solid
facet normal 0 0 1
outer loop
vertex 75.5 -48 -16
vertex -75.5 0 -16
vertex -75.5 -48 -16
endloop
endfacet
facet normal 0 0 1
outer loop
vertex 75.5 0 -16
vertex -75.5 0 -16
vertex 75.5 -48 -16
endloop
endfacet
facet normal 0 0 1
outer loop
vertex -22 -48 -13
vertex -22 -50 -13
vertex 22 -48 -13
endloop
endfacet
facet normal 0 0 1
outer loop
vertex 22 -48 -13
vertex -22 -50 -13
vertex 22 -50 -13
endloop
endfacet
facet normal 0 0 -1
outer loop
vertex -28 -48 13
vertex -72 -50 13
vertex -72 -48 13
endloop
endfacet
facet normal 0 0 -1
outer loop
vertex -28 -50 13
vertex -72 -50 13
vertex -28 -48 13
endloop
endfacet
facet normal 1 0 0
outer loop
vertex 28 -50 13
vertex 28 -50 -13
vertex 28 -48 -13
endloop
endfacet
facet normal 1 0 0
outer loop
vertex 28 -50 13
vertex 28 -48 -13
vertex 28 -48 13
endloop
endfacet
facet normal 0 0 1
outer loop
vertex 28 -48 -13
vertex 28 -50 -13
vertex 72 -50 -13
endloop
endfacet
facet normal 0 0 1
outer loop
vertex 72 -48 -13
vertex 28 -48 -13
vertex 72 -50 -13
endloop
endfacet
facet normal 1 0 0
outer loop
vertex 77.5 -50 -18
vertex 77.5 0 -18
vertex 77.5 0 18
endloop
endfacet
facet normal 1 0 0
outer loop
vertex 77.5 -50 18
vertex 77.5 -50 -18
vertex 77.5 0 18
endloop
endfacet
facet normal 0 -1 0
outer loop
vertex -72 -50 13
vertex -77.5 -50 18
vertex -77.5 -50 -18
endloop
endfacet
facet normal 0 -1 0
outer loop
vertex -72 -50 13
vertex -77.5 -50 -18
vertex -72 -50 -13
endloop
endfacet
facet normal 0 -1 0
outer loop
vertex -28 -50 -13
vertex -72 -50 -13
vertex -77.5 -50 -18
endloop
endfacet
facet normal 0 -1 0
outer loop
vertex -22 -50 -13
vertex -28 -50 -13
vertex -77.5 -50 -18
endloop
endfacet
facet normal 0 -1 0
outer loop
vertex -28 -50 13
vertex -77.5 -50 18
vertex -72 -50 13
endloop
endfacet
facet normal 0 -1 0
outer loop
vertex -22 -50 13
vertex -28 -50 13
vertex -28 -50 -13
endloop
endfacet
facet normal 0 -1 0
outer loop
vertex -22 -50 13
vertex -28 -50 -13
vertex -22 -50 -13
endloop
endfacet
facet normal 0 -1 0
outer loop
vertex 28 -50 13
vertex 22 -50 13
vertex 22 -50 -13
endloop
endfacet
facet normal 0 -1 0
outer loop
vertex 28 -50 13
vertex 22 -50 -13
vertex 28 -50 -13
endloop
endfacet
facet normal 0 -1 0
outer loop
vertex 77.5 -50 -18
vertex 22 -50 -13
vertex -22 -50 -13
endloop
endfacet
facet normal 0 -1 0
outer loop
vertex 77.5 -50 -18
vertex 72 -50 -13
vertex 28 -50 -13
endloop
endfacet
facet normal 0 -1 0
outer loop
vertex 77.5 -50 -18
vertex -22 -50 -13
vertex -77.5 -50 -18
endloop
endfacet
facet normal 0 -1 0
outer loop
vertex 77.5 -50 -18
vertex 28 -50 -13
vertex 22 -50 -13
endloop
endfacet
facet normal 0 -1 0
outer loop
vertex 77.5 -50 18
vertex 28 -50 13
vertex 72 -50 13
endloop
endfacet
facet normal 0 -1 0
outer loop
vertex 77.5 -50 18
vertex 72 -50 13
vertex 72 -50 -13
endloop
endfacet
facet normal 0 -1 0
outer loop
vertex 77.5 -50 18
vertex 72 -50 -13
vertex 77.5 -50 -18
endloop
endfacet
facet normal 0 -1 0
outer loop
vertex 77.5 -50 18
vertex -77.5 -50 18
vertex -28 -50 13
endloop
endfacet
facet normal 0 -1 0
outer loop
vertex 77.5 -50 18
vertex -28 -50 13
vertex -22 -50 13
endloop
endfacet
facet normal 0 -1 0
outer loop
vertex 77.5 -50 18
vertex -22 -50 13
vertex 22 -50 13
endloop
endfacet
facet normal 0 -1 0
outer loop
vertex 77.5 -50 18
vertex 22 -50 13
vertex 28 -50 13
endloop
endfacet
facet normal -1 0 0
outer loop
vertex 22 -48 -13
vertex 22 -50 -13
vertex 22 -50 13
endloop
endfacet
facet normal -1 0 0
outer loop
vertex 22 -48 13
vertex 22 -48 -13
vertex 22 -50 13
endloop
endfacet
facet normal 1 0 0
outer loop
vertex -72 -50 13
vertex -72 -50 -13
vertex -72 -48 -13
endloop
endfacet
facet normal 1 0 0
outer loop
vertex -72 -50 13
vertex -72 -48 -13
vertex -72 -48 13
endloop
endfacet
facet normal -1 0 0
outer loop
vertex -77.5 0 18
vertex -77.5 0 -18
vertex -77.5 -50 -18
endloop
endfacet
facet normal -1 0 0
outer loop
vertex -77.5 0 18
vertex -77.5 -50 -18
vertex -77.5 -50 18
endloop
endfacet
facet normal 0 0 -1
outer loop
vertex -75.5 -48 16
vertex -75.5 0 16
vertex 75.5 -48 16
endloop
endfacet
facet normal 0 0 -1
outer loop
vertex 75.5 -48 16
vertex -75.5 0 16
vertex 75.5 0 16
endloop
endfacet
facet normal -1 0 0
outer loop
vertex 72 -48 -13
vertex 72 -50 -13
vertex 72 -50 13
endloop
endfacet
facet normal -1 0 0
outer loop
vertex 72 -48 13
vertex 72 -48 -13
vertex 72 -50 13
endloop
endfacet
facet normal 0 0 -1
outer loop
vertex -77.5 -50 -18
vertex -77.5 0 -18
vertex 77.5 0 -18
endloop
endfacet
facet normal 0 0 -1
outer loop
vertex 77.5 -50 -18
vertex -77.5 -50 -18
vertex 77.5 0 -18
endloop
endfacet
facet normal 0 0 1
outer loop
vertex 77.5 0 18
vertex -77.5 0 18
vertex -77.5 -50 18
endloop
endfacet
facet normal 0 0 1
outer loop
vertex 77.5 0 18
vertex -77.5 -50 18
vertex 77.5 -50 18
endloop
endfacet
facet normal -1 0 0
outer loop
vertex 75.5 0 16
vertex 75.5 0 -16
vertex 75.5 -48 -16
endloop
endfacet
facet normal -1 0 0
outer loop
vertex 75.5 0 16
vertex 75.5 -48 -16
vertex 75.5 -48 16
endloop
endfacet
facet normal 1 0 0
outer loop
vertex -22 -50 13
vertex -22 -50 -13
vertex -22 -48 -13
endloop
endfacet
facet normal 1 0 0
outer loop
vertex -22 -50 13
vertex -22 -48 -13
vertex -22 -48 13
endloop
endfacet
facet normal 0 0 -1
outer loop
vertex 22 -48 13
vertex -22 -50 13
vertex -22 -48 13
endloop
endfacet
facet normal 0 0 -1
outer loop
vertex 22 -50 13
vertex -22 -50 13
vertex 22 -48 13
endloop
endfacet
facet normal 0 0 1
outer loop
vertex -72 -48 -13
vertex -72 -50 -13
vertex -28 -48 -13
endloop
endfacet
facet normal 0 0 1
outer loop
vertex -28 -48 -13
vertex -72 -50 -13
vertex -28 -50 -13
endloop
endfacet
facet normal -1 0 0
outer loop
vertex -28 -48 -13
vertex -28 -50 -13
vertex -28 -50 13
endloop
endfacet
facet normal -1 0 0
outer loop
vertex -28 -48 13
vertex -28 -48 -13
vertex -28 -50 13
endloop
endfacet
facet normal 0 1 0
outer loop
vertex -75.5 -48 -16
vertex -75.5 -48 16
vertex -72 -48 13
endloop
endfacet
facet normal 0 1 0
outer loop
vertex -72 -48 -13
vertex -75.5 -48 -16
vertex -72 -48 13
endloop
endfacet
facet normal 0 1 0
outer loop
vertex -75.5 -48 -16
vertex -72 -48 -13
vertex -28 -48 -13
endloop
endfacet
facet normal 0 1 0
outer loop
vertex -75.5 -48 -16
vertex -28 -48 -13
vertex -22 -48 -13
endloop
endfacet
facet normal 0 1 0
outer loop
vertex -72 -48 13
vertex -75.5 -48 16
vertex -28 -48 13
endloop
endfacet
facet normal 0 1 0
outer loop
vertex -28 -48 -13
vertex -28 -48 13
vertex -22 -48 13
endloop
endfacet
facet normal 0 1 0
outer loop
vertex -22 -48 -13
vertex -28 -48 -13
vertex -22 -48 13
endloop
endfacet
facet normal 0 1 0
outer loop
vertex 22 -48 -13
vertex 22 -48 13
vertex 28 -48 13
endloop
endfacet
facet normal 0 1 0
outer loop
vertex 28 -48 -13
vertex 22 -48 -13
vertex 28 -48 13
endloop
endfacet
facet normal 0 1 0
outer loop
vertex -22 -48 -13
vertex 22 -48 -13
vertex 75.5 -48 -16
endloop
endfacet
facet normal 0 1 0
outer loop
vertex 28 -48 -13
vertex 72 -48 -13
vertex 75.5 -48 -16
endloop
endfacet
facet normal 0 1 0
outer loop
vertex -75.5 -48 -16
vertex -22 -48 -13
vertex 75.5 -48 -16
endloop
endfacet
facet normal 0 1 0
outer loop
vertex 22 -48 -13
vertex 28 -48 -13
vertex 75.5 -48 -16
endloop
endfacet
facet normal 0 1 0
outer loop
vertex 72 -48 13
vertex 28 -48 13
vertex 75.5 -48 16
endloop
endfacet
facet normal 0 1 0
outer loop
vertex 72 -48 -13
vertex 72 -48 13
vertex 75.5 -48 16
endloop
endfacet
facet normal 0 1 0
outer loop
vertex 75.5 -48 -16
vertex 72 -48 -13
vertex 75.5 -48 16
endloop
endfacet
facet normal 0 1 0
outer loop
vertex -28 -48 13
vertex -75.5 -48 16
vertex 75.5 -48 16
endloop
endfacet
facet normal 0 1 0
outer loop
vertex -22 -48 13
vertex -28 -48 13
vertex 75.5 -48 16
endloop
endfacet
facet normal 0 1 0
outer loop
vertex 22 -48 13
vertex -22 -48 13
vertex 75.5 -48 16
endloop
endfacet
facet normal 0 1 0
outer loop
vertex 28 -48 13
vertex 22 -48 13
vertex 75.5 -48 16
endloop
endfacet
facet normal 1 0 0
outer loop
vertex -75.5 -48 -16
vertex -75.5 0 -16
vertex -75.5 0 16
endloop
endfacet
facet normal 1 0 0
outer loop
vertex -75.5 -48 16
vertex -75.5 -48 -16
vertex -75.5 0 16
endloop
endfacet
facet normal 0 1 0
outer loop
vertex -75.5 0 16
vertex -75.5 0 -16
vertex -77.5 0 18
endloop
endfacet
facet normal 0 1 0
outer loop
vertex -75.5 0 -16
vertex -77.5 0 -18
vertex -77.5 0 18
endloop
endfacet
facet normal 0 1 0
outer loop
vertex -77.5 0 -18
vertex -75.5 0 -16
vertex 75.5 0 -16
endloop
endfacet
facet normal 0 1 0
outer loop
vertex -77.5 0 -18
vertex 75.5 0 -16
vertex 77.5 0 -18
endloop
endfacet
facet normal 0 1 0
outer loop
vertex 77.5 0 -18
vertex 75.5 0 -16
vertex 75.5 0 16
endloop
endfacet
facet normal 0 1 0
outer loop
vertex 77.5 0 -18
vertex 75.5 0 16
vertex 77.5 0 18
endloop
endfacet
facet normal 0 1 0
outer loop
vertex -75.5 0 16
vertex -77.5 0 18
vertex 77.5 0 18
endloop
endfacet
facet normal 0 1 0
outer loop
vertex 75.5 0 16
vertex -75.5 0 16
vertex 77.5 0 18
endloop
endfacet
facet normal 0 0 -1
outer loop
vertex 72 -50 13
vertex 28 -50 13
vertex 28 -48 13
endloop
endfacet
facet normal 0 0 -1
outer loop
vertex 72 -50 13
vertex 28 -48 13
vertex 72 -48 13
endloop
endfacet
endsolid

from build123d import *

# Parameters (mm, degrees)
F0_W     = 155
F0_H     = 36
F1_DEPTH = 50
F2_T     = -2
F3_W     = 44
F3_H     = 26
F4_DEPTH = 25


with BuildPart() as f1:
    # F0 (on Front) → F1 (new body)
    with BuildSketch(Plane.XZ):
        Rectangle(F0_W, F0_H)
    extrude(amount=F1_DEPTH)

    # F2
    f2_openings = [f1.faces().sort_by_distance(p)[0] for p in [
        (0, 0, 0),
    ]]
    offset(amount=F2_T, openings=f2_openings)

    # F3 (on face) → F4 (cut)
    with BuildSketch(Plane.XZ.offset(50)):
        Rectangle(F3_W, F3_H)
        with Locations((-50, 0)):
            Rectangle(F3_W, F3_H)
        with Locations((50, 0)):
            Rectangle(F3_W, F3_H)
    extrude(amount=-F4_DEPTH, mode=Mode.SUBTRACT)


solid = f1.part
